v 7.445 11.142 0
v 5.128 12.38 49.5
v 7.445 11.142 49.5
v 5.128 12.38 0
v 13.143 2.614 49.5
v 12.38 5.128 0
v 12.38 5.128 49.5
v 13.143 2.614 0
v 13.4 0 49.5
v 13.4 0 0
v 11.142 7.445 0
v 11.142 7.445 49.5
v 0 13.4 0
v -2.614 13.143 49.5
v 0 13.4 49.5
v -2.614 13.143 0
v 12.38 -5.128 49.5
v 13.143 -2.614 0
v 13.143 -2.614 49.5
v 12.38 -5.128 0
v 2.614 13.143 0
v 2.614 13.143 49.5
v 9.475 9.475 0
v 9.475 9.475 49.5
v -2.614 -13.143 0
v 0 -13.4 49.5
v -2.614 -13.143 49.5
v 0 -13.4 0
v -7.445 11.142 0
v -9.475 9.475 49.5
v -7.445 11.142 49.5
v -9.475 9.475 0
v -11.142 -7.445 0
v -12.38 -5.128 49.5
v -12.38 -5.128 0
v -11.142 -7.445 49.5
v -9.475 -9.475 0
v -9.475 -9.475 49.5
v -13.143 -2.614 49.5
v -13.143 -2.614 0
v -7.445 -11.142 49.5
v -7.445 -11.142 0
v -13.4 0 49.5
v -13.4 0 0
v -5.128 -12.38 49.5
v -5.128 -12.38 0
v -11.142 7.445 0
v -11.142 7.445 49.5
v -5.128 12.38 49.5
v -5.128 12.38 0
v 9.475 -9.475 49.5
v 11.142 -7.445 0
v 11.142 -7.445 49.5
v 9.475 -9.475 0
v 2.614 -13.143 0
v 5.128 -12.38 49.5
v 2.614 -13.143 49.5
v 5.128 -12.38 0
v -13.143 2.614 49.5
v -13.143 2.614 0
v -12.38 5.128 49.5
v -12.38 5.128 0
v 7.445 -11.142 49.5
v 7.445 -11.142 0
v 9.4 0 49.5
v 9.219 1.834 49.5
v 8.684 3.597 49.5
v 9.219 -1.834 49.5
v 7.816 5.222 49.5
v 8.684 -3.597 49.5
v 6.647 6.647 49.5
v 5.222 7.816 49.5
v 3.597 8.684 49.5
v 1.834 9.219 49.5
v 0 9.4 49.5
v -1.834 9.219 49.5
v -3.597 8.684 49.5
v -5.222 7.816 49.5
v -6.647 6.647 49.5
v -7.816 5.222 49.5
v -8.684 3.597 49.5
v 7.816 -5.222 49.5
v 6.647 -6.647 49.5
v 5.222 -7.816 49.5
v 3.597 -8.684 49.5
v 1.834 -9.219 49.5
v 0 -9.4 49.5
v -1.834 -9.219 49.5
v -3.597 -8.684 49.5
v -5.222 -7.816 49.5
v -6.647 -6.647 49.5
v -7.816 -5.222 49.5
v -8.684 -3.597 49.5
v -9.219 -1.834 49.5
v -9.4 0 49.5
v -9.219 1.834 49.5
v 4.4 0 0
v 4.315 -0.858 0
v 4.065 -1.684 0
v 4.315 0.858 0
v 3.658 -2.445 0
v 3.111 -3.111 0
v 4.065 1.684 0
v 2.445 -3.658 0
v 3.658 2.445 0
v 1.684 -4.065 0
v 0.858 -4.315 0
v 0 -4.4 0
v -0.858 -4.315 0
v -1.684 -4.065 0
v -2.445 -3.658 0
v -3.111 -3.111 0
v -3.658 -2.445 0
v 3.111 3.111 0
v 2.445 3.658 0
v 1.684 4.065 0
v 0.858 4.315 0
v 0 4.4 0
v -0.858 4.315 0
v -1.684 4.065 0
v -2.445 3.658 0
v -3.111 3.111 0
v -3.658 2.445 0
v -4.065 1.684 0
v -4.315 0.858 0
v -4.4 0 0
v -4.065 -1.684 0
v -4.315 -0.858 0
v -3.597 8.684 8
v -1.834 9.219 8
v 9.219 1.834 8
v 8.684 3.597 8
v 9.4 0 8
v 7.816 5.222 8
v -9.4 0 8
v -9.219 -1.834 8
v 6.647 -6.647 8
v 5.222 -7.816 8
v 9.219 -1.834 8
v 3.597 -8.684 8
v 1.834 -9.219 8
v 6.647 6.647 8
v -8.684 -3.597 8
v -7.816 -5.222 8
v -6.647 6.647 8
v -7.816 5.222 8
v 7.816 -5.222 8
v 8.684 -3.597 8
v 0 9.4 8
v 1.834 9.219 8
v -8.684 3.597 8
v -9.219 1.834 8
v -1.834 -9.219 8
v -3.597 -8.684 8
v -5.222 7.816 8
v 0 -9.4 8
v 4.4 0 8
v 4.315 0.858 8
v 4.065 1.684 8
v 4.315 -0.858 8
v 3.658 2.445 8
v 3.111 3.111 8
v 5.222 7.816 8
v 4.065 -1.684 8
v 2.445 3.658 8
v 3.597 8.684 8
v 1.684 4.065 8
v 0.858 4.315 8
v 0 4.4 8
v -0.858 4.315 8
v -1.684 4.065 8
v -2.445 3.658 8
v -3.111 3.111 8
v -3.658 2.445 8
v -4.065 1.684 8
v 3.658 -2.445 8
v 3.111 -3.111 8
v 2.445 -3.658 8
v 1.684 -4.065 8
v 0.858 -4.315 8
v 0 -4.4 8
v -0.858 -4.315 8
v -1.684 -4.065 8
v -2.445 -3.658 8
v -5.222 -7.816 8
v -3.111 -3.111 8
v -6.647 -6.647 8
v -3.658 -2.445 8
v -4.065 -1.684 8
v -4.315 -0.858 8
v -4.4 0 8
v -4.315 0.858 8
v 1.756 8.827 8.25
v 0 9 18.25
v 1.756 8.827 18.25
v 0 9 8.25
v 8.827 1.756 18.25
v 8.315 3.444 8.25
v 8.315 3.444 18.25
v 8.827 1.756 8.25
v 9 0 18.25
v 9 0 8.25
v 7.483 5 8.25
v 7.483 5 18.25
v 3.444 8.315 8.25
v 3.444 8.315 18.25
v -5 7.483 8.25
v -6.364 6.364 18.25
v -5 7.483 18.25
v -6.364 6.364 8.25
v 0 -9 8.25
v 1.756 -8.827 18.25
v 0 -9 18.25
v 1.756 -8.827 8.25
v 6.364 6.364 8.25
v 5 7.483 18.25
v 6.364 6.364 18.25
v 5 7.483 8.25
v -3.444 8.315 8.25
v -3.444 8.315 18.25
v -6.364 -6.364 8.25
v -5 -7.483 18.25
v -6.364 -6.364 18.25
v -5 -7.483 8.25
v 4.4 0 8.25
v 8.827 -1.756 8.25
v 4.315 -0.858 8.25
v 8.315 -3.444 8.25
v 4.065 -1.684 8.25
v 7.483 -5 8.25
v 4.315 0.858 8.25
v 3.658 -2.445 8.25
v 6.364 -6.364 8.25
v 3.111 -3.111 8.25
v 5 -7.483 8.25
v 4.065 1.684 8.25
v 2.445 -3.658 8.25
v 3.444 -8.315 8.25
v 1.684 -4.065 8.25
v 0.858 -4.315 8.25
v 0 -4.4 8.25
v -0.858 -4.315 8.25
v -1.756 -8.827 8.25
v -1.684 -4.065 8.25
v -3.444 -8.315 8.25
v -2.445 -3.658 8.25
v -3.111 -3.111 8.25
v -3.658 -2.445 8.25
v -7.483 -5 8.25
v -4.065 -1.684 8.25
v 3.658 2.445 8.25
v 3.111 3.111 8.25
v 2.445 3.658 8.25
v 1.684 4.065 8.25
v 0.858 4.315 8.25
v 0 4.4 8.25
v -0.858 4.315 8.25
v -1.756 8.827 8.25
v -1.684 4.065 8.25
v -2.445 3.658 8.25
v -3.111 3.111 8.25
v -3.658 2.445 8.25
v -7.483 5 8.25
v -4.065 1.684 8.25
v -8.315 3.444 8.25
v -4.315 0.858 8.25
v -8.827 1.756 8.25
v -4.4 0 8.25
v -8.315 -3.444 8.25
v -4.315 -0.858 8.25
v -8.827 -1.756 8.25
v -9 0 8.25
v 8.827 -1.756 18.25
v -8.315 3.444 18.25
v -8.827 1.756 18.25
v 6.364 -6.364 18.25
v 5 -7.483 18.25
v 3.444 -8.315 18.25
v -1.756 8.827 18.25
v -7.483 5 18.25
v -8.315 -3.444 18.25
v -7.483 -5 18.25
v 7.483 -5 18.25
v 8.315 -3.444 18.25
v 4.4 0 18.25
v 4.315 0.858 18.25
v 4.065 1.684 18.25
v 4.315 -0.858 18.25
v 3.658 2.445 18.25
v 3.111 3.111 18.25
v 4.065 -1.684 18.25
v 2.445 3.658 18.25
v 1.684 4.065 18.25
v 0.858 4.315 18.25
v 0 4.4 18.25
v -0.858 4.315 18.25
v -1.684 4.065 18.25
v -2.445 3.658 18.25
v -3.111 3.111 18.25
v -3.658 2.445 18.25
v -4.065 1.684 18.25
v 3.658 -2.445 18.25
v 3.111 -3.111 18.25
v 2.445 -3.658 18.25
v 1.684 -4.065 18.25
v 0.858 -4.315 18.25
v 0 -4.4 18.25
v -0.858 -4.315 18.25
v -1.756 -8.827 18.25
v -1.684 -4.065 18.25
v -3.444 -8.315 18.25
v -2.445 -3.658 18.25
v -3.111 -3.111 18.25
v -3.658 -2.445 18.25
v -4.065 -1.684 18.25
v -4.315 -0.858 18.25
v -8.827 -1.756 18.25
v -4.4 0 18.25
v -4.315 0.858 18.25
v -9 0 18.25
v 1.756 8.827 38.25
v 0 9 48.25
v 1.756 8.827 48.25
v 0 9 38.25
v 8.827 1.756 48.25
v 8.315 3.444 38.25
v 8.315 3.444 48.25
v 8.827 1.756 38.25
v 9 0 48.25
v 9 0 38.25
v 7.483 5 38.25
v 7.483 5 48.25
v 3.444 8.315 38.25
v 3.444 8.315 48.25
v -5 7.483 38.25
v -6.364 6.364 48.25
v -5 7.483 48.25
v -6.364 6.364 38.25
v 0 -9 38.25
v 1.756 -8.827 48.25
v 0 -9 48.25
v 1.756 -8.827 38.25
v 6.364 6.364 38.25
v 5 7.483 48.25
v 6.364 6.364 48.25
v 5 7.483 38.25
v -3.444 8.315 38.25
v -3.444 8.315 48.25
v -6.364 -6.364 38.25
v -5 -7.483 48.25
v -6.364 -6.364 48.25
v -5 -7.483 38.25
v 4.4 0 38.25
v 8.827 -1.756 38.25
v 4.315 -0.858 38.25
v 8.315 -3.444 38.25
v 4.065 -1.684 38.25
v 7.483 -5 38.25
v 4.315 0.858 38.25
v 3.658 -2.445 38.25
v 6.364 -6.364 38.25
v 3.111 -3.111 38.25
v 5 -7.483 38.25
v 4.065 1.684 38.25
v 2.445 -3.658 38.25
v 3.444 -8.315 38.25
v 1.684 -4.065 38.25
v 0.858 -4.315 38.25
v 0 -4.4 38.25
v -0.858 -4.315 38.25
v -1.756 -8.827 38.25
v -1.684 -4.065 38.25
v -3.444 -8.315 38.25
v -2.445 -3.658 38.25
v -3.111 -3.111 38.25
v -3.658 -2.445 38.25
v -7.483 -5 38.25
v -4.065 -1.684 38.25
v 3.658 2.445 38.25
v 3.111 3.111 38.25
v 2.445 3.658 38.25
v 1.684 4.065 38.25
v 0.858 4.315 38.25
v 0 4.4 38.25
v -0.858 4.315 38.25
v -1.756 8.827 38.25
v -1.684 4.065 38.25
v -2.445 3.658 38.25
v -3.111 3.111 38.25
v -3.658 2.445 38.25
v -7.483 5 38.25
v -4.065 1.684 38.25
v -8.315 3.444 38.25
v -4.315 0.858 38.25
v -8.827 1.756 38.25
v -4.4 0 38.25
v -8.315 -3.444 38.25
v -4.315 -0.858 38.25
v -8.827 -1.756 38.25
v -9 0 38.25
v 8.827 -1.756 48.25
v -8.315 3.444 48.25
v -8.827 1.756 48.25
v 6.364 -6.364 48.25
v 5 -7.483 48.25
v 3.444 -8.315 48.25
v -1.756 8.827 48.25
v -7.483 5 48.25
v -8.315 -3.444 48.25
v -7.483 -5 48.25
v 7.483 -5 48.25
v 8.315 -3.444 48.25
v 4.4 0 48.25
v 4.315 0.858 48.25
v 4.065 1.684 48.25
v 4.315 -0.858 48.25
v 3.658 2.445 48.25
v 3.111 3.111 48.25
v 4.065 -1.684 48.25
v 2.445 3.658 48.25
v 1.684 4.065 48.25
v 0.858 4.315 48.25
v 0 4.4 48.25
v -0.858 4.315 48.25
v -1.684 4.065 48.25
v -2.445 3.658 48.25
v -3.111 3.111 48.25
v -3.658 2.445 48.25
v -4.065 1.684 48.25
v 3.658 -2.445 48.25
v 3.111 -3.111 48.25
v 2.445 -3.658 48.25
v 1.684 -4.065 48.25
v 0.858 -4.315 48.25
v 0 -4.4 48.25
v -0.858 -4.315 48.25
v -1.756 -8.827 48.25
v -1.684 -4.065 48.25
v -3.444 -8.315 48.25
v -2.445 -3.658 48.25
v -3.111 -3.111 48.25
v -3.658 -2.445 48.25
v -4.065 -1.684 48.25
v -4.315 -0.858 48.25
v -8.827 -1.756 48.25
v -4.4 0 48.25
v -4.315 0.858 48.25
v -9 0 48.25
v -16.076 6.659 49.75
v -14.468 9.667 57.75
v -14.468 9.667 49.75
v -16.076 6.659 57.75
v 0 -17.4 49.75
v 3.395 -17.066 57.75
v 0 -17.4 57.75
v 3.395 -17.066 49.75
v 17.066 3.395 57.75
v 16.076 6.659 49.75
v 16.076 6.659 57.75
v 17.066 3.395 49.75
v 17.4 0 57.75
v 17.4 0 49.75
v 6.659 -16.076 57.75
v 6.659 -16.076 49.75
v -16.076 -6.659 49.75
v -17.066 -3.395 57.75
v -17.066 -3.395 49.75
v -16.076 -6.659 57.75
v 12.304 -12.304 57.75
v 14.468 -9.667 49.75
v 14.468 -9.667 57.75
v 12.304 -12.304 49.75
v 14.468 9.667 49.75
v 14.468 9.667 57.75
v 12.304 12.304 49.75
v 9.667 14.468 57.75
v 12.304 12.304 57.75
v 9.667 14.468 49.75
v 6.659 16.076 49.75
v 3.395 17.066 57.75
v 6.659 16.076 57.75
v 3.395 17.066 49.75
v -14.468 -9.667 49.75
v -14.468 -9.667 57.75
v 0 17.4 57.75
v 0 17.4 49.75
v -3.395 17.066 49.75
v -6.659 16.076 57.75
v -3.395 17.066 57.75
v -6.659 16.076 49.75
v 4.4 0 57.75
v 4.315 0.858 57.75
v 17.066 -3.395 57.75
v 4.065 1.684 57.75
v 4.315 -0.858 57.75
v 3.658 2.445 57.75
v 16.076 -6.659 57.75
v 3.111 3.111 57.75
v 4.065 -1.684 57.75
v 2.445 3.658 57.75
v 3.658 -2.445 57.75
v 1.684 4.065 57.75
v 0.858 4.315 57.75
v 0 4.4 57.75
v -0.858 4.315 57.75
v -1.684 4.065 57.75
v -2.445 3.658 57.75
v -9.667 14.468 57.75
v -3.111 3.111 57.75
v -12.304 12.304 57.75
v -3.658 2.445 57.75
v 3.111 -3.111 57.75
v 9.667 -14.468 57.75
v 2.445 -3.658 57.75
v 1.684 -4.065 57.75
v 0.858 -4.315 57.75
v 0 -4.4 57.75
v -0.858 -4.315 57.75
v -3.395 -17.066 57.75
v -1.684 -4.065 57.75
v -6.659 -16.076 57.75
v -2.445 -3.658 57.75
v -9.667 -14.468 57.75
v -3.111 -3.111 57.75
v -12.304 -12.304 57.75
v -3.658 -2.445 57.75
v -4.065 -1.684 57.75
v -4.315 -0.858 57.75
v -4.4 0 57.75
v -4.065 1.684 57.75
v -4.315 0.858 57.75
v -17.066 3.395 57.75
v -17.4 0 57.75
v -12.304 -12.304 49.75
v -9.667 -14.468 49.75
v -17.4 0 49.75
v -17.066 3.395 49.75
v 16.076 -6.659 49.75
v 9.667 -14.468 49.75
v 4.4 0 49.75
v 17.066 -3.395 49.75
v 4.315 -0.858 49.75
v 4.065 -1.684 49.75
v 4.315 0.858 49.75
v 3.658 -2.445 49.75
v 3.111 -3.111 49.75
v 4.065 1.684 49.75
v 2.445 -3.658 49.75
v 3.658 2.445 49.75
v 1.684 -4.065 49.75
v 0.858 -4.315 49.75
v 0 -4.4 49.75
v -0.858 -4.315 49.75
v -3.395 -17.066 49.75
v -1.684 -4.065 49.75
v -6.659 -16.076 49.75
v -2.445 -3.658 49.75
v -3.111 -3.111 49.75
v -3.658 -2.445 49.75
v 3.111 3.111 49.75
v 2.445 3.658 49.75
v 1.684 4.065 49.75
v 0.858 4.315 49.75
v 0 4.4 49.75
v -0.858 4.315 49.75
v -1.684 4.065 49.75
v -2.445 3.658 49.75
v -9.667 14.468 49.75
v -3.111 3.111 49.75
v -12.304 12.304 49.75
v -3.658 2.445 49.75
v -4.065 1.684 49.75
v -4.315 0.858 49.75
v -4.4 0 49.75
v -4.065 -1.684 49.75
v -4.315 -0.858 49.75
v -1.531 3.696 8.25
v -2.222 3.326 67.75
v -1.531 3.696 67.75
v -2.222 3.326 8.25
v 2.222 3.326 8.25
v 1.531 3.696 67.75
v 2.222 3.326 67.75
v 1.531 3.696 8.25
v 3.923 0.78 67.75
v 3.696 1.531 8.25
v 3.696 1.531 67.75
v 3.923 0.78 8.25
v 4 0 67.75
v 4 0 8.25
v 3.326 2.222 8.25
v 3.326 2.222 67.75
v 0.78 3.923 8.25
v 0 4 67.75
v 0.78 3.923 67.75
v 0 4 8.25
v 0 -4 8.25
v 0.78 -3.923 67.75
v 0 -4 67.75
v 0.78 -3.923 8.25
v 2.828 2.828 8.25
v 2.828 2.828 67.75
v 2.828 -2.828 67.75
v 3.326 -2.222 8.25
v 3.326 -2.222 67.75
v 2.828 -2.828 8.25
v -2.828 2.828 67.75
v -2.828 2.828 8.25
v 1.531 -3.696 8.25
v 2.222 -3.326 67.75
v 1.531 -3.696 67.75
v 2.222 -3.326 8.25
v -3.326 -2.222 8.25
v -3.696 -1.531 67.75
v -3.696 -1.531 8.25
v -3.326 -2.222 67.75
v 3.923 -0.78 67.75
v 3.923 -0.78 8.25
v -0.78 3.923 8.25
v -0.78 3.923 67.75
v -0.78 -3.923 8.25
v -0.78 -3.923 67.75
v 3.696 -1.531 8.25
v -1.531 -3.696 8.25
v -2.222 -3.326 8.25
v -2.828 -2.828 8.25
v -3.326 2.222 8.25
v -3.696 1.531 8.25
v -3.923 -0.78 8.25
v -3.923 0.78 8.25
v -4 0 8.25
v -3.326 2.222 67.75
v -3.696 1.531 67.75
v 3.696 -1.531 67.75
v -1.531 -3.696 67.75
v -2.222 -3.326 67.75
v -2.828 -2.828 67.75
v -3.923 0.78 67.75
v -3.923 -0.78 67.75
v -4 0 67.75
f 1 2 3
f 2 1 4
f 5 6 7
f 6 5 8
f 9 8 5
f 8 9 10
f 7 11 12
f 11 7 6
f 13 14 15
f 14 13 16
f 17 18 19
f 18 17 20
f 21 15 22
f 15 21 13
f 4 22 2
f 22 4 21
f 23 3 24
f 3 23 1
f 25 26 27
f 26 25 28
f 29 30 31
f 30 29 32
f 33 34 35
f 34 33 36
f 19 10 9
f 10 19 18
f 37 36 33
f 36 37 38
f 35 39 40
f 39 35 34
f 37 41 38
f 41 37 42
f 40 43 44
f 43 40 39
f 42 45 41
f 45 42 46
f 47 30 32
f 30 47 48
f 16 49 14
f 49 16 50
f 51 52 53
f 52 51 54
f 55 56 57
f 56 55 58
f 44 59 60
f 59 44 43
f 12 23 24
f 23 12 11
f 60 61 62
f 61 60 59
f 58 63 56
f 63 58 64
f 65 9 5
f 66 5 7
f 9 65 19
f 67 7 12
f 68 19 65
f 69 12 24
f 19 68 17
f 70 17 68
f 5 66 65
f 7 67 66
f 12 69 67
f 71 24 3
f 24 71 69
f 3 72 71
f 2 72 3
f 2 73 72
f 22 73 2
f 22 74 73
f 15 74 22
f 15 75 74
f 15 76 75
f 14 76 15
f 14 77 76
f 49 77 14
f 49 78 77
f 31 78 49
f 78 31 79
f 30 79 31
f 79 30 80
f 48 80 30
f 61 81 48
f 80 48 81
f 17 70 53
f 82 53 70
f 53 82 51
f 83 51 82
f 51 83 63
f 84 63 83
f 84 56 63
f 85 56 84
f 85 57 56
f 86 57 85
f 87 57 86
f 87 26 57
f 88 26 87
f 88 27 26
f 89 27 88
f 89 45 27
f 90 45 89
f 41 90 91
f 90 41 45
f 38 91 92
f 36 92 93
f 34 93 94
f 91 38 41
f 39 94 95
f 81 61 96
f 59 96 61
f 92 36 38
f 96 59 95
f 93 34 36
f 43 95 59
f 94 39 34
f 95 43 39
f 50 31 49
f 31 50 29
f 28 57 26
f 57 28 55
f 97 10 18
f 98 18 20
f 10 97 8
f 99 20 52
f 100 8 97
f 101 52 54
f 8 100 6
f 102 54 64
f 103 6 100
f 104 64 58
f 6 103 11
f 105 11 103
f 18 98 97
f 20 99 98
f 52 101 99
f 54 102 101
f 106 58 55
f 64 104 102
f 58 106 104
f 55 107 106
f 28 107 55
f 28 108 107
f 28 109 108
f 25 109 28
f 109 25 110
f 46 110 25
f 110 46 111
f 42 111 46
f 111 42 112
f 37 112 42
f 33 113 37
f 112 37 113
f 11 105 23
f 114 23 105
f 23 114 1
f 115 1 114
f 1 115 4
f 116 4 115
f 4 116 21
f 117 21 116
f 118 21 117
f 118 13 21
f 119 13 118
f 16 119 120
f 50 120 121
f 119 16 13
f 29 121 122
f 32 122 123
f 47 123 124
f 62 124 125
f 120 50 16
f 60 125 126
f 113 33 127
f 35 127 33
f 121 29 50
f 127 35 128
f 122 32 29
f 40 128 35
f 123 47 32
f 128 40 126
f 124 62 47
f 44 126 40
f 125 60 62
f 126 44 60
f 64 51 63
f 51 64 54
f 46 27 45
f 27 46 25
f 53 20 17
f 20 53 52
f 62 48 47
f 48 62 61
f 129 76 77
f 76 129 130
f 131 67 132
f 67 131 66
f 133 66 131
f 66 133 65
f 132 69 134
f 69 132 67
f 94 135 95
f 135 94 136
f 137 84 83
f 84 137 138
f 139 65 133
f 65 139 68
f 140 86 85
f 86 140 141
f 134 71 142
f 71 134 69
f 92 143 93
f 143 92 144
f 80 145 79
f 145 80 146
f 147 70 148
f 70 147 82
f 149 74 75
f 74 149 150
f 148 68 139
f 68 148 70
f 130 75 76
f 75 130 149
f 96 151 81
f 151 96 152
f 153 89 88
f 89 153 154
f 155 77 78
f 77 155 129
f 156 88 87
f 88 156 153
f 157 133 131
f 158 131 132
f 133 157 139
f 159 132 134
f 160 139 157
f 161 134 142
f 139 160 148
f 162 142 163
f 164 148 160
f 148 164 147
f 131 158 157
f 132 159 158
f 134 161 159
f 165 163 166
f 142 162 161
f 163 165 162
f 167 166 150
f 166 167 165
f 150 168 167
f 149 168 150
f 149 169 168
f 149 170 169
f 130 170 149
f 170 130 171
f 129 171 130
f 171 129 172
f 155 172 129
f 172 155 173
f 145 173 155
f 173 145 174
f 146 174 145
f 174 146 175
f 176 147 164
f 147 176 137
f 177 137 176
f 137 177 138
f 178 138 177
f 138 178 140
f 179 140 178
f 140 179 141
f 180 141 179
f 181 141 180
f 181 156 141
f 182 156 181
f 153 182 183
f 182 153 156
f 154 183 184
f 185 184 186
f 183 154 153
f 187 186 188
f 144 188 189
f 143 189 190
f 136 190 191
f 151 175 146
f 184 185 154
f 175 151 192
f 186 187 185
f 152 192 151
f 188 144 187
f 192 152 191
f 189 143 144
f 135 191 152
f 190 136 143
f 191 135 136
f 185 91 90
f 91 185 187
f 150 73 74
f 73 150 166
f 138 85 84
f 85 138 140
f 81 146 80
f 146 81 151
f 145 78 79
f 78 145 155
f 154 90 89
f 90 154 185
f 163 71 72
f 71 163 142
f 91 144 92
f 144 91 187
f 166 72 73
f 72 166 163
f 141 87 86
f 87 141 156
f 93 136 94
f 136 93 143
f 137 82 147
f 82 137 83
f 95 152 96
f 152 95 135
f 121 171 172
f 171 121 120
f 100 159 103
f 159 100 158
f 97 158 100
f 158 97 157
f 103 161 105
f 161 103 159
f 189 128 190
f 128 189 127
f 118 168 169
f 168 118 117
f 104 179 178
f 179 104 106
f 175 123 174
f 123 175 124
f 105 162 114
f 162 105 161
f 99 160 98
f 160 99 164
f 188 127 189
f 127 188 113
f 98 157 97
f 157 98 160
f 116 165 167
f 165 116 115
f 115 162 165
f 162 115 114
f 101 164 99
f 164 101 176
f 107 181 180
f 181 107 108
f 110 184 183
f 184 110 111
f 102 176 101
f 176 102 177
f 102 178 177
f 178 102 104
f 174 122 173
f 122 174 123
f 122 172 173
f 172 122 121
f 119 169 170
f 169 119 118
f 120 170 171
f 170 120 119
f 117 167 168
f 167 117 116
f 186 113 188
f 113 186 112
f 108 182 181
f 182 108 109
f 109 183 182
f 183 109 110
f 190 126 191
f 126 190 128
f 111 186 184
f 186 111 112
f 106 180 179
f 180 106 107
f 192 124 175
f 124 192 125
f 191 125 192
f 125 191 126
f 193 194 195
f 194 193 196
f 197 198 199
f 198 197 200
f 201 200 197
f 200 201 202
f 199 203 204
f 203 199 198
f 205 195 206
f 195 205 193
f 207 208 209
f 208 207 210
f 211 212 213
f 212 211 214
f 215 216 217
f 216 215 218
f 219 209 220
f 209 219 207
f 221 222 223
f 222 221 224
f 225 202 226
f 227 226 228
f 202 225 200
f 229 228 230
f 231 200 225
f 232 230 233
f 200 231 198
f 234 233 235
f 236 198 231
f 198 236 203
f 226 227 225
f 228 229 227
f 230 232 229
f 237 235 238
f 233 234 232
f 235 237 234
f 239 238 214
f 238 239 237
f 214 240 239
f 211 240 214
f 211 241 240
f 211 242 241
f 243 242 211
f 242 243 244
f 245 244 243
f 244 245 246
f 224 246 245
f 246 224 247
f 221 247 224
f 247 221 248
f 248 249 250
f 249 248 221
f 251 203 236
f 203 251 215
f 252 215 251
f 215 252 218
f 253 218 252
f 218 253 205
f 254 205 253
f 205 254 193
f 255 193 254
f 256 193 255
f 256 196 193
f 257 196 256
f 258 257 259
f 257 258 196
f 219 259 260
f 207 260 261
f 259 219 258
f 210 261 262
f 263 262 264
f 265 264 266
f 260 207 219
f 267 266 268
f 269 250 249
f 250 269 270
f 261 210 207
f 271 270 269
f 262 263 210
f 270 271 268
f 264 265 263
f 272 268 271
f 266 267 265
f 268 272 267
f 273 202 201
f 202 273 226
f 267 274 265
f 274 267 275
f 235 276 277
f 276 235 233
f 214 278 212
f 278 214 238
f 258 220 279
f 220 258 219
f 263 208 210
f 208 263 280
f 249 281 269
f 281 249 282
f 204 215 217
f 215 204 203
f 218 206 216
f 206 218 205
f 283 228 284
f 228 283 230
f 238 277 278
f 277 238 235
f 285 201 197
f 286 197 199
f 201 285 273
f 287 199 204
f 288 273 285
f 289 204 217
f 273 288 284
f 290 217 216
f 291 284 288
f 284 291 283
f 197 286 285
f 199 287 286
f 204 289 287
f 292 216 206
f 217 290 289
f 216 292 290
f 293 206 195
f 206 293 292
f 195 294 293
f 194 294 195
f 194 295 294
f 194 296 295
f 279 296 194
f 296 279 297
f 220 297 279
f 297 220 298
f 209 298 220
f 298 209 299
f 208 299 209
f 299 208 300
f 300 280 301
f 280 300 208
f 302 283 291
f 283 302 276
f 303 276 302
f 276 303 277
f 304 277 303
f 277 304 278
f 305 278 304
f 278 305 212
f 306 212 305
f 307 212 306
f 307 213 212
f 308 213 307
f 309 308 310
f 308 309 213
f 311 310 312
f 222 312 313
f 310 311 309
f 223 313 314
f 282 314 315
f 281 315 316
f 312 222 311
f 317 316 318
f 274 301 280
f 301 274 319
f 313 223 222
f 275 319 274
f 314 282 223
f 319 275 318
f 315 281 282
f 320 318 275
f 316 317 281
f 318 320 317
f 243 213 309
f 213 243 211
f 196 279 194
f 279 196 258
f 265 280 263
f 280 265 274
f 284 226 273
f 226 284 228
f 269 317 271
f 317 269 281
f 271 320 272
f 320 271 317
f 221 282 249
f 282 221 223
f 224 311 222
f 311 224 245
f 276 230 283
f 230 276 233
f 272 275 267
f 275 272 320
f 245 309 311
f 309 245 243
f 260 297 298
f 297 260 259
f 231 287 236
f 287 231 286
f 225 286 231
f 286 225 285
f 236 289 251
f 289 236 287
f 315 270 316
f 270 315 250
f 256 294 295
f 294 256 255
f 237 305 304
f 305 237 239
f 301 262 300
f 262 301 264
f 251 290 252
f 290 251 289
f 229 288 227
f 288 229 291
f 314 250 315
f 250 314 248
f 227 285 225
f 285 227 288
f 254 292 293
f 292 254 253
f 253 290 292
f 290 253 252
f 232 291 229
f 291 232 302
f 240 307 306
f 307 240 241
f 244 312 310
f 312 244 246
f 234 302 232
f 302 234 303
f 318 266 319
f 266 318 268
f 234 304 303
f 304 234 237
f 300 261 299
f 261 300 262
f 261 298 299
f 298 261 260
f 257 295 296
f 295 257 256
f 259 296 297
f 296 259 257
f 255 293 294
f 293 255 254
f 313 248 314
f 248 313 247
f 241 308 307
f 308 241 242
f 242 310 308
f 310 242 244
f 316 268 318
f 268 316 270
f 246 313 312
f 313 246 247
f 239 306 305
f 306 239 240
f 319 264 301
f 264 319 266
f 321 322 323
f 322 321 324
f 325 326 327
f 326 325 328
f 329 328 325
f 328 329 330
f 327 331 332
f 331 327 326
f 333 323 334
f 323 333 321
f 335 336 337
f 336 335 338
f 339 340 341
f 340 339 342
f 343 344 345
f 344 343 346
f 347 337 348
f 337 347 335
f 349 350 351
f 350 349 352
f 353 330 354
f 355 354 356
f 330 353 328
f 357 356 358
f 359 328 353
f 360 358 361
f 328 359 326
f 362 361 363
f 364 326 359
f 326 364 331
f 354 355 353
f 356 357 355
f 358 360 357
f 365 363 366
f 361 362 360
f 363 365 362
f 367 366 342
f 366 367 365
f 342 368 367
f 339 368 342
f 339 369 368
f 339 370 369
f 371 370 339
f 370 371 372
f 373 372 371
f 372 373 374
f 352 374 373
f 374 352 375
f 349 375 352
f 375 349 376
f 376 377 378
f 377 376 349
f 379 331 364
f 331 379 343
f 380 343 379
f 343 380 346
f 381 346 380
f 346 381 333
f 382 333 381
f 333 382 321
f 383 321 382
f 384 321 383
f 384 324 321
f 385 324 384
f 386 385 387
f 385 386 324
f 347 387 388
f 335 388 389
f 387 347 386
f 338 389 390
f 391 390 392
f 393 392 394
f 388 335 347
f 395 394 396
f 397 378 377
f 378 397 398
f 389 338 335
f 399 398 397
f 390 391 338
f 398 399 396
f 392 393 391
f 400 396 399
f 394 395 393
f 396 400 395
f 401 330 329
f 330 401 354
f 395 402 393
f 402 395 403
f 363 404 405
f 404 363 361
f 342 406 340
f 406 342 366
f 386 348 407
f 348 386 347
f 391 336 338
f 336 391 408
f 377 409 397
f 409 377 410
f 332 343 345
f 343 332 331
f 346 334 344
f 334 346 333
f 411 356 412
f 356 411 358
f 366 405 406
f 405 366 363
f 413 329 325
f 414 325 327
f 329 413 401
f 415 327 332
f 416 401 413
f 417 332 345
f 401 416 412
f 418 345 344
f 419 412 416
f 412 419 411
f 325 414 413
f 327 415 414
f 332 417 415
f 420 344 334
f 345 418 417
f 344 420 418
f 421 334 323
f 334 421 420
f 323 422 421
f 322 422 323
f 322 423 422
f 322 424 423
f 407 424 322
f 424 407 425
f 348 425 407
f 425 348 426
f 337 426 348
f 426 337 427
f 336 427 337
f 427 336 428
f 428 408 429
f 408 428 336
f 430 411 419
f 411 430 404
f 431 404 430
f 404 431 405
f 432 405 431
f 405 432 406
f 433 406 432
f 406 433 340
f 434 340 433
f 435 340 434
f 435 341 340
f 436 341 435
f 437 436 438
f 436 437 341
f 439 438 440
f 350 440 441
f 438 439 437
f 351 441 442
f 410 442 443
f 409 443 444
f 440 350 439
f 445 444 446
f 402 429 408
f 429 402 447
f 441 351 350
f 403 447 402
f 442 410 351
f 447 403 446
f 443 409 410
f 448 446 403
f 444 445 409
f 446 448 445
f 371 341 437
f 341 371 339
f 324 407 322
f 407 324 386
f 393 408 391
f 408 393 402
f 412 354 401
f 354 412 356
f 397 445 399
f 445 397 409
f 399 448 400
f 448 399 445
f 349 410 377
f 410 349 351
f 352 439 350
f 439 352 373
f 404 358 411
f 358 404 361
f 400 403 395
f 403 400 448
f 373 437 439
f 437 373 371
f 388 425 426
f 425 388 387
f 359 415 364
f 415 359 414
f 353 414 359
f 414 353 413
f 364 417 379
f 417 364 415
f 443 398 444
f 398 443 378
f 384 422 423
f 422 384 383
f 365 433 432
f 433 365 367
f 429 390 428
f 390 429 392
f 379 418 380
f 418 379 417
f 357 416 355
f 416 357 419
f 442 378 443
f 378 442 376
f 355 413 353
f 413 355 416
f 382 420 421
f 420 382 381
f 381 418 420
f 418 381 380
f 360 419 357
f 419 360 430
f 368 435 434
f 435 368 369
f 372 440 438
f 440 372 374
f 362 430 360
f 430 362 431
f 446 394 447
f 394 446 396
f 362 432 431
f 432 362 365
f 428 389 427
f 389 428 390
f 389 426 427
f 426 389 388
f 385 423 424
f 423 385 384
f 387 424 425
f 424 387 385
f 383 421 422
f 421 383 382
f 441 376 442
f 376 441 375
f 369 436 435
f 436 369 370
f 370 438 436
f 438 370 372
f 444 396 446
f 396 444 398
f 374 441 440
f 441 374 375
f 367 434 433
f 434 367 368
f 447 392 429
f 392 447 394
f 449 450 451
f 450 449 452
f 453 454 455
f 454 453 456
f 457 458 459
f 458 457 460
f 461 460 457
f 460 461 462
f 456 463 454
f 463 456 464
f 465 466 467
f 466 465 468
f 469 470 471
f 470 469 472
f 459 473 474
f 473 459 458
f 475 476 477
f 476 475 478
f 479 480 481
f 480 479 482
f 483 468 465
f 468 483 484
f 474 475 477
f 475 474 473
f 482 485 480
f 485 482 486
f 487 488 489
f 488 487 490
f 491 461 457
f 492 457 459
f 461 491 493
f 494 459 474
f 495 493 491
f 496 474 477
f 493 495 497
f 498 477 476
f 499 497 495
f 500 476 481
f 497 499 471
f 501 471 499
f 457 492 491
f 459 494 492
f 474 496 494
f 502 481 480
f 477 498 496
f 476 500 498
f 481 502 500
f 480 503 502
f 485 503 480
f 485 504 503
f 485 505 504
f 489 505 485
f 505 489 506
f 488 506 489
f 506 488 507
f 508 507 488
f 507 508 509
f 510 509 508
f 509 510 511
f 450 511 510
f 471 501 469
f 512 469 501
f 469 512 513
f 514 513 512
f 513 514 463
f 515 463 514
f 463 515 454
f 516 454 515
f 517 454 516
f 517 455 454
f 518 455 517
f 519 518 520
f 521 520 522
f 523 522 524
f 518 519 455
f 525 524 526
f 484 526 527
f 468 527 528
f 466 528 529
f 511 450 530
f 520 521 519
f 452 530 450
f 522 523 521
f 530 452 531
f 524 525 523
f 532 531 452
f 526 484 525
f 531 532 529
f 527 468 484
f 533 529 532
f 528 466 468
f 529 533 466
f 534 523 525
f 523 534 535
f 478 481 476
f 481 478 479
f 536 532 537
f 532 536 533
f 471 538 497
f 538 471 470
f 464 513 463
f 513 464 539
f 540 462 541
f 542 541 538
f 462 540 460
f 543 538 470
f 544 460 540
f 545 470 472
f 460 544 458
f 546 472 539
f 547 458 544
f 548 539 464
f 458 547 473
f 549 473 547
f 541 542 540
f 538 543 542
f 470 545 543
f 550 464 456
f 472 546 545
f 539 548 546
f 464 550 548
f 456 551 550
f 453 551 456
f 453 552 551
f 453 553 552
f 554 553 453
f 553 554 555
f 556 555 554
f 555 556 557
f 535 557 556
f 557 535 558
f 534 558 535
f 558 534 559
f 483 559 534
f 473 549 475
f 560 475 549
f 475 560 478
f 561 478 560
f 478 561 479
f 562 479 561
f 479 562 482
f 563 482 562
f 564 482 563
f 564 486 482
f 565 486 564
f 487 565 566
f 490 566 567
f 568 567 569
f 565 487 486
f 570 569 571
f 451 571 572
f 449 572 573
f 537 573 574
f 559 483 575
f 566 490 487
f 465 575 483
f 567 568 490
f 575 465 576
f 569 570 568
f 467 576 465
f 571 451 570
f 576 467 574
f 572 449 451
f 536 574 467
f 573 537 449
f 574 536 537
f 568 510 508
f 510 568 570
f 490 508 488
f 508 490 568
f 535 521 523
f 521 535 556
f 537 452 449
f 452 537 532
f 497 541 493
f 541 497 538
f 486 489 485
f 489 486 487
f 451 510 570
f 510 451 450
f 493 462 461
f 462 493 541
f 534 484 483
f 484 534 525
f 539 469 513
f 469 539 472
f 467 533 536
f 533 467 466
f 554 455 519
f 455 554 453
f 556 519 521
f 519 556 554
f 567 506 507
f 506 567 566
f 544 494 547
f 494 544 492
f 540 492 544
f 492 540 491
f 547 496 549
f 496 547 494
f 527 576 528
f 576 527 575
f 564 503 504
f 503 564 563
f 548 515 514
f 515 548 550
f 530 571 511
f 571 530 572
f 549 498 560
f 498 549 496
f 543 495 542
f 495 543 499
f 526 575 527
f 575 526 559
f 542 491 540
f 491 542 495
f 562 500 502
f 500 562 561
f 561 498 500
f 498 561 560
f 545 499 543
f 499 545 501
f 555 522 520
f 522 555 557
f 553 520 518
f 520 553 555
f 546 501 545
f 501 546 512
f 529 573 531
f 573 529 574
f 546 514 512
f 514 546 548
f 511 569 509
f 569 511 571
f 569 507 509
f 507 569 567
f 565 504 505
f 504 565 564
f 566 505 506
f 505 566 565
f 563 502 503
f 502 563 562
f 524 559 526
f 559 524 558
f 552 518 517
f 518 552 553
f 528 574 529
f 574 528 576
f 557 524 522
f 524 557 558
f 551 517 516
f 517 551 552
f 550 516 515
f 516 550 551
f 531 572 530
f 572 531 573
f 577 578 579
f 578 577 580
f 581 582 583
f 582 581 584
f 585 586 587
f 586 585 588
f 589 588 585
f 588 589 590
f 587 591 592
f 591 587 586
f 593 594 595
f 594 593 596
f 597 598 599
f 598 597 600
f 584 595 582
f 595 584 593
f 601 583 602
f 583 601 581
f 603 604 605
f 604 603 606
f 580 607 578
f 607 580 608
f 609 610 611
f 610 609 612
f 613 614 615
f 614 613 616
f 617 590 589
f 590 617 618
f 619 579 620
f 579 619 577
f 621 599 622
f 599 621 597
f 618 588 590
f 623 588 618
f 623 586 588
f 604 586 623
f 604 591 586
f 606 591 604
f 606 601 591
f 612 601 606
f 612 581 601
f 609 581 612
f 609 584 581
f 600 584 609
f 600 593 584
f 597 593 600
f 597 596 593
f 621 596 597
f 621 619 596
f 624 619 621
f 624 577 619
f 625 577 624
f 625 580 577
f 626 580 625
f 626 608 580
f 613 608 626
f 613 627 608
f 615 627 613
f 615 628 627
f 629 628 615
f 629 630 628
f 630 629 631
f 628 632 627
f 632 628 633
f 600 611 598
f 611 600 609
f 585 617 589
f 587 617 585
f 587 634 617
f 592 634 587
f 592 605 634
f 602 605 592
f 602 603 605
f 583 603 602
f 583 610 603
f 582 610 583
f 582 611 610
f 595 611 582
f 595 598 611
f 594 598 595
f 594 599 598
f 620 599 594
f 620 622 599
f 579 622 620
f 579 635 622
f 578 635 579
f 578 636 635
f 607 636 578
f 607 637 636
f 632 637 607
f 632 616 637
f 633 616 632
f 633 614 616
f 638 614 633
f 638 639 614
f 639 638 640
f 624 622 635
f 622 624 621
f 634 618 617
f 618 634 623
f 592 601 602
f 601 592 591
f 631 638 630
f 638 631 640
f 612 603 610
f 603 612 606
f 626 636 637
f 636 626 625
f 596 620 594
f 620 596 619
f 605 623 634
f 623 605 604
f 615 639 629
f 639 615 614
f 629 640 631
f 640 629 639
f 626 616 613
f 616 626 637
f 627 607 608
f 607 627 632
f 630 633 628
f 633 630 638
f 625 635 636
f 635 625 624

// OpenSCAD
$fn = 32;

// ------------------------------------------------------------------------
// Shaft station: cup d26.8 x 49.5 mm, shaft d8
// Every part is its own module, assembly() places every instance.
// ------------------------------------------------------------------------

// --- part 1 ---
module housing_cup() {
  difference() {
    cylinder(h = 49.5, d = 26.8);
    translate([0, 0, 8]) cylinder(h = 42.5, d = 18.8);
    translate([0, 0, -1]) cylinder(h = 10, d = 8.8);
  }
}

// --- part 2 ---
module bearing_lower() {
  difference() {
      translate([0, 0, 0]) cylinder(h = 10, d = 18);
      translate([0, 0, -1]) cylinder(h = 12, d = 8.8);
    }
}

// --- part 3 ---
module bearing_upper() {
  difference() {
      translate([0, 0, 0]) cylinder(h = 10, d = 18);
      translate([0, 0, -1]) cylinder(h = 12, d = 8.8);
    }
}

// --- part 4 ---
module station_shaft() {
  translate([0, 0, -29.75]) cylinder(h = 59.5, d = 8);
}

// --- part 5 ---
module station_cover() {
  difference() {
    cylinder(h = 8, d = 34.8);
    translate([0, 0, -1]) cylinder(h = 10, d = 8.8);
  }
}

// --- assembly ---
module assembly() {
  color([0.80, 0.24, 0.20]) translate([0, 0, 0]) rotate([0, 0, 0]) housing_cup();
  color([0.20, 0.45, 0.75]) translate([0, 0, 8.25]) rotate([0, 0, 0]) bearing_lower();
  color([0.25, 0.62, 0.32]) translate([0, 0, 38.25]) rotate([0, 0, 0]) bearing_upper();
  color([0.92, 0.70, 0.18]) translate([0, 0, 38]) rotate([0, 0, 0]) station_shaft();
  color([0.58, 0.35, 0.70]) translate([0, 0, 49.75]) rotate([0, 0, 0]) station_cover();
}

assembly();
